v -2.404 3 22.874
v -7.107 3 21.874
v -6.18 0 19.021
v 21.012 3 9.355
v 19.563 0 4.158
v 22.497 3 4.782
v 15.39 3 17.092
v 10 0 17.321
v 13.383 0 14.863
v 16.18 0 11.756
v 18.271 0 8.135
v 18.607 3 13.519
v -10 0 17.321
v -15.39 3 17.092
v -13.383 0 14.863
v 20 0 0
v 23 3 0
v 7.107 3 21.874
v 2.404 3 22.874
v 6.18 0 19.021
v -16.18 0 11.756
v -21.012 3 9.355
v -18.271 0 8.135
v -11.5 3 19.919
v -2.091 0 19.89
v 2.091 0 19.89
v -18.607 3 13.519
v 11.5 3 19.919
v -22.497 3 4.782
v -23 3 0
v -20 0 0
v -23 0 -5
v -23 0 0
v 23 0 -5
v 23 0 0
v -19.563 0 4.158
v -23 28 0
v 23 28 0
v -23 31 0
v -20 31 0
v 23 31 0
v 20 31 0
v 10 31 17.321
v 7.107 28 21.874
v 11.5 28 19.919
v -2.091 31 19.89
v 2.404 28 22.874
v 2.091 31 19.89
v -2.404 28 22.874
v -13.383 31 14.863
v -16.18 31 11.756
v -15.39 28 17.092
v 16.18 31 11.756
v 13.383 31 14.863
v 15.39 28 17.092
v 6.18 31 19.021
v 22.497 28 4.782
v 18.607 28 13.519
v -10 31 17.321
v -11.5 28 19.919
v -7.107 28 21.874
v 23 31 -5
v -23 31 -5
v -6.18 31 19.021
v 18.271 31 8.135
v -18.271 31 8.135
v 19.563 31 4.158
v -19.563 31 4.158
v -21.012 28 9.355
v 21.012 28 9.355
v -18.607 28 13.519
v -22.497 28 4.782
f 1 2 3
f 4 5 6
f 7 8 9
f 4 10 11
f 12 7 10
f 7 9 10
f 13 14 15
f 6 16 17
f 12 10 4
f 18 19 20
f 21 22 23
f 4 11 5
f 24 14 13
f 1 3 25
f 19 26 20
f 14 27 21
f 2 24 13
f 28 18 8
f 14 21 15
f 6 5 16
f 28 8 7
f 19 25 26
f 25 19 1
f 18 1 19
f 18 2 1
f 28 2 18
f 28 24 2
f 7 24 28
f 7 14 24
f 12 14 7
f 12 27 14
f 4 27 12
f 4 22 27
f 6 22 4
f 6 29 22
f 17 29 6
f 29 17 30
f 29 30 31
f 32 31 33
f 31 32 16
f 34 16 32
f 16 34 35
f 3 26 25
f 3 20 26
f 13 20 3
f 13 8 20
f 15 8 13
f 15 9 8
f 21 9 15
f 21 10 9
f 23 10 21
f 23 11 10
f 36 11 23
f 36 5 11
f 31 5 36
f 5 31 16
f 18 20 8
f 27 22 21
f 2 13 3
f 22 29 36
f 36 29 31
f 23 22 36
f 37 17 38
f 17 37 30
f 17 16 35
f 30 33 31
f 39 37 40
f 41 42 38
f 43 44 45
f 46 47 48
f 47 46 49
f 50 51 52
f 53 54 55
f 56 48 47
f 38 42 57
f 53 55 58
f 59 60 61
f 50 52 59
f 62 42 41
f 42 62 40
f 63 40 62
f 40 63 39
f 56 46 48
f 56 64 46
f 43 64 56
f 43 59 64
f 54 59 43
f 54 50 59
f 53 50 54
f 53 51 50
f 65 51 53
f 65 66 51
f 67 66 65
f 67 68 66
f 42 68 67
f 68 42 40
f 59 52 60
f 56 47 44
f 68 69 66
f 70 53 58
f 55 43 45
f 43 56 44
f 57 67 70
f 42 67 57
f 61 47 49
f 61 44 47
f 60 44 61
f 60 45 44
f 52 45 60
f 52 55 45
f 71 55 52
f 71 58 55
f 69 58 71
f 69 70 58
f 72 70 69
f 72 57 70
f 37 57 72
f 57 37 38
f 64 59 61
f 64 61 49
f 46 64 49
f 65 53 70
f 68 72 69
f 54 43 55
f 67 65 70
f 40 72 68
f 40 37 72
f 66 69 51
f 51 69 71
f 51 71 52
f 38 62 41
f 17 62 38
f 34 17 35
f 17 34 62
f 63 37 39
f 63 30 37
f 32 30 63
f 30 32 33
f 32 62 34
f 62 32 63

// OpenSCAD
use <MCAD/boxes.scad>

/* HDD stand base */
width=71;
length=105;
screw_dist=76;
thickness=5;
drill_rad=1.5;
base_thickness=3;


module halfcircle(r1,r2,h) {
           r = max(r1,r2);
  	   difference() {     
	cylinder(h,r1,r2);
	 translate([-r,0,0]) cube([r*2,r,r]);
	}
}

rm=23;
rl=20;
module part() {
halfcircle(rl,rm,base_thickness);
translate([0,0,28]) halfcircle(rm,rl,base_thickness);
translate([-rm,0,0]) cube([rm*2,5,28+base_thickness]);
}

rotate([-90,0,0]) part();
